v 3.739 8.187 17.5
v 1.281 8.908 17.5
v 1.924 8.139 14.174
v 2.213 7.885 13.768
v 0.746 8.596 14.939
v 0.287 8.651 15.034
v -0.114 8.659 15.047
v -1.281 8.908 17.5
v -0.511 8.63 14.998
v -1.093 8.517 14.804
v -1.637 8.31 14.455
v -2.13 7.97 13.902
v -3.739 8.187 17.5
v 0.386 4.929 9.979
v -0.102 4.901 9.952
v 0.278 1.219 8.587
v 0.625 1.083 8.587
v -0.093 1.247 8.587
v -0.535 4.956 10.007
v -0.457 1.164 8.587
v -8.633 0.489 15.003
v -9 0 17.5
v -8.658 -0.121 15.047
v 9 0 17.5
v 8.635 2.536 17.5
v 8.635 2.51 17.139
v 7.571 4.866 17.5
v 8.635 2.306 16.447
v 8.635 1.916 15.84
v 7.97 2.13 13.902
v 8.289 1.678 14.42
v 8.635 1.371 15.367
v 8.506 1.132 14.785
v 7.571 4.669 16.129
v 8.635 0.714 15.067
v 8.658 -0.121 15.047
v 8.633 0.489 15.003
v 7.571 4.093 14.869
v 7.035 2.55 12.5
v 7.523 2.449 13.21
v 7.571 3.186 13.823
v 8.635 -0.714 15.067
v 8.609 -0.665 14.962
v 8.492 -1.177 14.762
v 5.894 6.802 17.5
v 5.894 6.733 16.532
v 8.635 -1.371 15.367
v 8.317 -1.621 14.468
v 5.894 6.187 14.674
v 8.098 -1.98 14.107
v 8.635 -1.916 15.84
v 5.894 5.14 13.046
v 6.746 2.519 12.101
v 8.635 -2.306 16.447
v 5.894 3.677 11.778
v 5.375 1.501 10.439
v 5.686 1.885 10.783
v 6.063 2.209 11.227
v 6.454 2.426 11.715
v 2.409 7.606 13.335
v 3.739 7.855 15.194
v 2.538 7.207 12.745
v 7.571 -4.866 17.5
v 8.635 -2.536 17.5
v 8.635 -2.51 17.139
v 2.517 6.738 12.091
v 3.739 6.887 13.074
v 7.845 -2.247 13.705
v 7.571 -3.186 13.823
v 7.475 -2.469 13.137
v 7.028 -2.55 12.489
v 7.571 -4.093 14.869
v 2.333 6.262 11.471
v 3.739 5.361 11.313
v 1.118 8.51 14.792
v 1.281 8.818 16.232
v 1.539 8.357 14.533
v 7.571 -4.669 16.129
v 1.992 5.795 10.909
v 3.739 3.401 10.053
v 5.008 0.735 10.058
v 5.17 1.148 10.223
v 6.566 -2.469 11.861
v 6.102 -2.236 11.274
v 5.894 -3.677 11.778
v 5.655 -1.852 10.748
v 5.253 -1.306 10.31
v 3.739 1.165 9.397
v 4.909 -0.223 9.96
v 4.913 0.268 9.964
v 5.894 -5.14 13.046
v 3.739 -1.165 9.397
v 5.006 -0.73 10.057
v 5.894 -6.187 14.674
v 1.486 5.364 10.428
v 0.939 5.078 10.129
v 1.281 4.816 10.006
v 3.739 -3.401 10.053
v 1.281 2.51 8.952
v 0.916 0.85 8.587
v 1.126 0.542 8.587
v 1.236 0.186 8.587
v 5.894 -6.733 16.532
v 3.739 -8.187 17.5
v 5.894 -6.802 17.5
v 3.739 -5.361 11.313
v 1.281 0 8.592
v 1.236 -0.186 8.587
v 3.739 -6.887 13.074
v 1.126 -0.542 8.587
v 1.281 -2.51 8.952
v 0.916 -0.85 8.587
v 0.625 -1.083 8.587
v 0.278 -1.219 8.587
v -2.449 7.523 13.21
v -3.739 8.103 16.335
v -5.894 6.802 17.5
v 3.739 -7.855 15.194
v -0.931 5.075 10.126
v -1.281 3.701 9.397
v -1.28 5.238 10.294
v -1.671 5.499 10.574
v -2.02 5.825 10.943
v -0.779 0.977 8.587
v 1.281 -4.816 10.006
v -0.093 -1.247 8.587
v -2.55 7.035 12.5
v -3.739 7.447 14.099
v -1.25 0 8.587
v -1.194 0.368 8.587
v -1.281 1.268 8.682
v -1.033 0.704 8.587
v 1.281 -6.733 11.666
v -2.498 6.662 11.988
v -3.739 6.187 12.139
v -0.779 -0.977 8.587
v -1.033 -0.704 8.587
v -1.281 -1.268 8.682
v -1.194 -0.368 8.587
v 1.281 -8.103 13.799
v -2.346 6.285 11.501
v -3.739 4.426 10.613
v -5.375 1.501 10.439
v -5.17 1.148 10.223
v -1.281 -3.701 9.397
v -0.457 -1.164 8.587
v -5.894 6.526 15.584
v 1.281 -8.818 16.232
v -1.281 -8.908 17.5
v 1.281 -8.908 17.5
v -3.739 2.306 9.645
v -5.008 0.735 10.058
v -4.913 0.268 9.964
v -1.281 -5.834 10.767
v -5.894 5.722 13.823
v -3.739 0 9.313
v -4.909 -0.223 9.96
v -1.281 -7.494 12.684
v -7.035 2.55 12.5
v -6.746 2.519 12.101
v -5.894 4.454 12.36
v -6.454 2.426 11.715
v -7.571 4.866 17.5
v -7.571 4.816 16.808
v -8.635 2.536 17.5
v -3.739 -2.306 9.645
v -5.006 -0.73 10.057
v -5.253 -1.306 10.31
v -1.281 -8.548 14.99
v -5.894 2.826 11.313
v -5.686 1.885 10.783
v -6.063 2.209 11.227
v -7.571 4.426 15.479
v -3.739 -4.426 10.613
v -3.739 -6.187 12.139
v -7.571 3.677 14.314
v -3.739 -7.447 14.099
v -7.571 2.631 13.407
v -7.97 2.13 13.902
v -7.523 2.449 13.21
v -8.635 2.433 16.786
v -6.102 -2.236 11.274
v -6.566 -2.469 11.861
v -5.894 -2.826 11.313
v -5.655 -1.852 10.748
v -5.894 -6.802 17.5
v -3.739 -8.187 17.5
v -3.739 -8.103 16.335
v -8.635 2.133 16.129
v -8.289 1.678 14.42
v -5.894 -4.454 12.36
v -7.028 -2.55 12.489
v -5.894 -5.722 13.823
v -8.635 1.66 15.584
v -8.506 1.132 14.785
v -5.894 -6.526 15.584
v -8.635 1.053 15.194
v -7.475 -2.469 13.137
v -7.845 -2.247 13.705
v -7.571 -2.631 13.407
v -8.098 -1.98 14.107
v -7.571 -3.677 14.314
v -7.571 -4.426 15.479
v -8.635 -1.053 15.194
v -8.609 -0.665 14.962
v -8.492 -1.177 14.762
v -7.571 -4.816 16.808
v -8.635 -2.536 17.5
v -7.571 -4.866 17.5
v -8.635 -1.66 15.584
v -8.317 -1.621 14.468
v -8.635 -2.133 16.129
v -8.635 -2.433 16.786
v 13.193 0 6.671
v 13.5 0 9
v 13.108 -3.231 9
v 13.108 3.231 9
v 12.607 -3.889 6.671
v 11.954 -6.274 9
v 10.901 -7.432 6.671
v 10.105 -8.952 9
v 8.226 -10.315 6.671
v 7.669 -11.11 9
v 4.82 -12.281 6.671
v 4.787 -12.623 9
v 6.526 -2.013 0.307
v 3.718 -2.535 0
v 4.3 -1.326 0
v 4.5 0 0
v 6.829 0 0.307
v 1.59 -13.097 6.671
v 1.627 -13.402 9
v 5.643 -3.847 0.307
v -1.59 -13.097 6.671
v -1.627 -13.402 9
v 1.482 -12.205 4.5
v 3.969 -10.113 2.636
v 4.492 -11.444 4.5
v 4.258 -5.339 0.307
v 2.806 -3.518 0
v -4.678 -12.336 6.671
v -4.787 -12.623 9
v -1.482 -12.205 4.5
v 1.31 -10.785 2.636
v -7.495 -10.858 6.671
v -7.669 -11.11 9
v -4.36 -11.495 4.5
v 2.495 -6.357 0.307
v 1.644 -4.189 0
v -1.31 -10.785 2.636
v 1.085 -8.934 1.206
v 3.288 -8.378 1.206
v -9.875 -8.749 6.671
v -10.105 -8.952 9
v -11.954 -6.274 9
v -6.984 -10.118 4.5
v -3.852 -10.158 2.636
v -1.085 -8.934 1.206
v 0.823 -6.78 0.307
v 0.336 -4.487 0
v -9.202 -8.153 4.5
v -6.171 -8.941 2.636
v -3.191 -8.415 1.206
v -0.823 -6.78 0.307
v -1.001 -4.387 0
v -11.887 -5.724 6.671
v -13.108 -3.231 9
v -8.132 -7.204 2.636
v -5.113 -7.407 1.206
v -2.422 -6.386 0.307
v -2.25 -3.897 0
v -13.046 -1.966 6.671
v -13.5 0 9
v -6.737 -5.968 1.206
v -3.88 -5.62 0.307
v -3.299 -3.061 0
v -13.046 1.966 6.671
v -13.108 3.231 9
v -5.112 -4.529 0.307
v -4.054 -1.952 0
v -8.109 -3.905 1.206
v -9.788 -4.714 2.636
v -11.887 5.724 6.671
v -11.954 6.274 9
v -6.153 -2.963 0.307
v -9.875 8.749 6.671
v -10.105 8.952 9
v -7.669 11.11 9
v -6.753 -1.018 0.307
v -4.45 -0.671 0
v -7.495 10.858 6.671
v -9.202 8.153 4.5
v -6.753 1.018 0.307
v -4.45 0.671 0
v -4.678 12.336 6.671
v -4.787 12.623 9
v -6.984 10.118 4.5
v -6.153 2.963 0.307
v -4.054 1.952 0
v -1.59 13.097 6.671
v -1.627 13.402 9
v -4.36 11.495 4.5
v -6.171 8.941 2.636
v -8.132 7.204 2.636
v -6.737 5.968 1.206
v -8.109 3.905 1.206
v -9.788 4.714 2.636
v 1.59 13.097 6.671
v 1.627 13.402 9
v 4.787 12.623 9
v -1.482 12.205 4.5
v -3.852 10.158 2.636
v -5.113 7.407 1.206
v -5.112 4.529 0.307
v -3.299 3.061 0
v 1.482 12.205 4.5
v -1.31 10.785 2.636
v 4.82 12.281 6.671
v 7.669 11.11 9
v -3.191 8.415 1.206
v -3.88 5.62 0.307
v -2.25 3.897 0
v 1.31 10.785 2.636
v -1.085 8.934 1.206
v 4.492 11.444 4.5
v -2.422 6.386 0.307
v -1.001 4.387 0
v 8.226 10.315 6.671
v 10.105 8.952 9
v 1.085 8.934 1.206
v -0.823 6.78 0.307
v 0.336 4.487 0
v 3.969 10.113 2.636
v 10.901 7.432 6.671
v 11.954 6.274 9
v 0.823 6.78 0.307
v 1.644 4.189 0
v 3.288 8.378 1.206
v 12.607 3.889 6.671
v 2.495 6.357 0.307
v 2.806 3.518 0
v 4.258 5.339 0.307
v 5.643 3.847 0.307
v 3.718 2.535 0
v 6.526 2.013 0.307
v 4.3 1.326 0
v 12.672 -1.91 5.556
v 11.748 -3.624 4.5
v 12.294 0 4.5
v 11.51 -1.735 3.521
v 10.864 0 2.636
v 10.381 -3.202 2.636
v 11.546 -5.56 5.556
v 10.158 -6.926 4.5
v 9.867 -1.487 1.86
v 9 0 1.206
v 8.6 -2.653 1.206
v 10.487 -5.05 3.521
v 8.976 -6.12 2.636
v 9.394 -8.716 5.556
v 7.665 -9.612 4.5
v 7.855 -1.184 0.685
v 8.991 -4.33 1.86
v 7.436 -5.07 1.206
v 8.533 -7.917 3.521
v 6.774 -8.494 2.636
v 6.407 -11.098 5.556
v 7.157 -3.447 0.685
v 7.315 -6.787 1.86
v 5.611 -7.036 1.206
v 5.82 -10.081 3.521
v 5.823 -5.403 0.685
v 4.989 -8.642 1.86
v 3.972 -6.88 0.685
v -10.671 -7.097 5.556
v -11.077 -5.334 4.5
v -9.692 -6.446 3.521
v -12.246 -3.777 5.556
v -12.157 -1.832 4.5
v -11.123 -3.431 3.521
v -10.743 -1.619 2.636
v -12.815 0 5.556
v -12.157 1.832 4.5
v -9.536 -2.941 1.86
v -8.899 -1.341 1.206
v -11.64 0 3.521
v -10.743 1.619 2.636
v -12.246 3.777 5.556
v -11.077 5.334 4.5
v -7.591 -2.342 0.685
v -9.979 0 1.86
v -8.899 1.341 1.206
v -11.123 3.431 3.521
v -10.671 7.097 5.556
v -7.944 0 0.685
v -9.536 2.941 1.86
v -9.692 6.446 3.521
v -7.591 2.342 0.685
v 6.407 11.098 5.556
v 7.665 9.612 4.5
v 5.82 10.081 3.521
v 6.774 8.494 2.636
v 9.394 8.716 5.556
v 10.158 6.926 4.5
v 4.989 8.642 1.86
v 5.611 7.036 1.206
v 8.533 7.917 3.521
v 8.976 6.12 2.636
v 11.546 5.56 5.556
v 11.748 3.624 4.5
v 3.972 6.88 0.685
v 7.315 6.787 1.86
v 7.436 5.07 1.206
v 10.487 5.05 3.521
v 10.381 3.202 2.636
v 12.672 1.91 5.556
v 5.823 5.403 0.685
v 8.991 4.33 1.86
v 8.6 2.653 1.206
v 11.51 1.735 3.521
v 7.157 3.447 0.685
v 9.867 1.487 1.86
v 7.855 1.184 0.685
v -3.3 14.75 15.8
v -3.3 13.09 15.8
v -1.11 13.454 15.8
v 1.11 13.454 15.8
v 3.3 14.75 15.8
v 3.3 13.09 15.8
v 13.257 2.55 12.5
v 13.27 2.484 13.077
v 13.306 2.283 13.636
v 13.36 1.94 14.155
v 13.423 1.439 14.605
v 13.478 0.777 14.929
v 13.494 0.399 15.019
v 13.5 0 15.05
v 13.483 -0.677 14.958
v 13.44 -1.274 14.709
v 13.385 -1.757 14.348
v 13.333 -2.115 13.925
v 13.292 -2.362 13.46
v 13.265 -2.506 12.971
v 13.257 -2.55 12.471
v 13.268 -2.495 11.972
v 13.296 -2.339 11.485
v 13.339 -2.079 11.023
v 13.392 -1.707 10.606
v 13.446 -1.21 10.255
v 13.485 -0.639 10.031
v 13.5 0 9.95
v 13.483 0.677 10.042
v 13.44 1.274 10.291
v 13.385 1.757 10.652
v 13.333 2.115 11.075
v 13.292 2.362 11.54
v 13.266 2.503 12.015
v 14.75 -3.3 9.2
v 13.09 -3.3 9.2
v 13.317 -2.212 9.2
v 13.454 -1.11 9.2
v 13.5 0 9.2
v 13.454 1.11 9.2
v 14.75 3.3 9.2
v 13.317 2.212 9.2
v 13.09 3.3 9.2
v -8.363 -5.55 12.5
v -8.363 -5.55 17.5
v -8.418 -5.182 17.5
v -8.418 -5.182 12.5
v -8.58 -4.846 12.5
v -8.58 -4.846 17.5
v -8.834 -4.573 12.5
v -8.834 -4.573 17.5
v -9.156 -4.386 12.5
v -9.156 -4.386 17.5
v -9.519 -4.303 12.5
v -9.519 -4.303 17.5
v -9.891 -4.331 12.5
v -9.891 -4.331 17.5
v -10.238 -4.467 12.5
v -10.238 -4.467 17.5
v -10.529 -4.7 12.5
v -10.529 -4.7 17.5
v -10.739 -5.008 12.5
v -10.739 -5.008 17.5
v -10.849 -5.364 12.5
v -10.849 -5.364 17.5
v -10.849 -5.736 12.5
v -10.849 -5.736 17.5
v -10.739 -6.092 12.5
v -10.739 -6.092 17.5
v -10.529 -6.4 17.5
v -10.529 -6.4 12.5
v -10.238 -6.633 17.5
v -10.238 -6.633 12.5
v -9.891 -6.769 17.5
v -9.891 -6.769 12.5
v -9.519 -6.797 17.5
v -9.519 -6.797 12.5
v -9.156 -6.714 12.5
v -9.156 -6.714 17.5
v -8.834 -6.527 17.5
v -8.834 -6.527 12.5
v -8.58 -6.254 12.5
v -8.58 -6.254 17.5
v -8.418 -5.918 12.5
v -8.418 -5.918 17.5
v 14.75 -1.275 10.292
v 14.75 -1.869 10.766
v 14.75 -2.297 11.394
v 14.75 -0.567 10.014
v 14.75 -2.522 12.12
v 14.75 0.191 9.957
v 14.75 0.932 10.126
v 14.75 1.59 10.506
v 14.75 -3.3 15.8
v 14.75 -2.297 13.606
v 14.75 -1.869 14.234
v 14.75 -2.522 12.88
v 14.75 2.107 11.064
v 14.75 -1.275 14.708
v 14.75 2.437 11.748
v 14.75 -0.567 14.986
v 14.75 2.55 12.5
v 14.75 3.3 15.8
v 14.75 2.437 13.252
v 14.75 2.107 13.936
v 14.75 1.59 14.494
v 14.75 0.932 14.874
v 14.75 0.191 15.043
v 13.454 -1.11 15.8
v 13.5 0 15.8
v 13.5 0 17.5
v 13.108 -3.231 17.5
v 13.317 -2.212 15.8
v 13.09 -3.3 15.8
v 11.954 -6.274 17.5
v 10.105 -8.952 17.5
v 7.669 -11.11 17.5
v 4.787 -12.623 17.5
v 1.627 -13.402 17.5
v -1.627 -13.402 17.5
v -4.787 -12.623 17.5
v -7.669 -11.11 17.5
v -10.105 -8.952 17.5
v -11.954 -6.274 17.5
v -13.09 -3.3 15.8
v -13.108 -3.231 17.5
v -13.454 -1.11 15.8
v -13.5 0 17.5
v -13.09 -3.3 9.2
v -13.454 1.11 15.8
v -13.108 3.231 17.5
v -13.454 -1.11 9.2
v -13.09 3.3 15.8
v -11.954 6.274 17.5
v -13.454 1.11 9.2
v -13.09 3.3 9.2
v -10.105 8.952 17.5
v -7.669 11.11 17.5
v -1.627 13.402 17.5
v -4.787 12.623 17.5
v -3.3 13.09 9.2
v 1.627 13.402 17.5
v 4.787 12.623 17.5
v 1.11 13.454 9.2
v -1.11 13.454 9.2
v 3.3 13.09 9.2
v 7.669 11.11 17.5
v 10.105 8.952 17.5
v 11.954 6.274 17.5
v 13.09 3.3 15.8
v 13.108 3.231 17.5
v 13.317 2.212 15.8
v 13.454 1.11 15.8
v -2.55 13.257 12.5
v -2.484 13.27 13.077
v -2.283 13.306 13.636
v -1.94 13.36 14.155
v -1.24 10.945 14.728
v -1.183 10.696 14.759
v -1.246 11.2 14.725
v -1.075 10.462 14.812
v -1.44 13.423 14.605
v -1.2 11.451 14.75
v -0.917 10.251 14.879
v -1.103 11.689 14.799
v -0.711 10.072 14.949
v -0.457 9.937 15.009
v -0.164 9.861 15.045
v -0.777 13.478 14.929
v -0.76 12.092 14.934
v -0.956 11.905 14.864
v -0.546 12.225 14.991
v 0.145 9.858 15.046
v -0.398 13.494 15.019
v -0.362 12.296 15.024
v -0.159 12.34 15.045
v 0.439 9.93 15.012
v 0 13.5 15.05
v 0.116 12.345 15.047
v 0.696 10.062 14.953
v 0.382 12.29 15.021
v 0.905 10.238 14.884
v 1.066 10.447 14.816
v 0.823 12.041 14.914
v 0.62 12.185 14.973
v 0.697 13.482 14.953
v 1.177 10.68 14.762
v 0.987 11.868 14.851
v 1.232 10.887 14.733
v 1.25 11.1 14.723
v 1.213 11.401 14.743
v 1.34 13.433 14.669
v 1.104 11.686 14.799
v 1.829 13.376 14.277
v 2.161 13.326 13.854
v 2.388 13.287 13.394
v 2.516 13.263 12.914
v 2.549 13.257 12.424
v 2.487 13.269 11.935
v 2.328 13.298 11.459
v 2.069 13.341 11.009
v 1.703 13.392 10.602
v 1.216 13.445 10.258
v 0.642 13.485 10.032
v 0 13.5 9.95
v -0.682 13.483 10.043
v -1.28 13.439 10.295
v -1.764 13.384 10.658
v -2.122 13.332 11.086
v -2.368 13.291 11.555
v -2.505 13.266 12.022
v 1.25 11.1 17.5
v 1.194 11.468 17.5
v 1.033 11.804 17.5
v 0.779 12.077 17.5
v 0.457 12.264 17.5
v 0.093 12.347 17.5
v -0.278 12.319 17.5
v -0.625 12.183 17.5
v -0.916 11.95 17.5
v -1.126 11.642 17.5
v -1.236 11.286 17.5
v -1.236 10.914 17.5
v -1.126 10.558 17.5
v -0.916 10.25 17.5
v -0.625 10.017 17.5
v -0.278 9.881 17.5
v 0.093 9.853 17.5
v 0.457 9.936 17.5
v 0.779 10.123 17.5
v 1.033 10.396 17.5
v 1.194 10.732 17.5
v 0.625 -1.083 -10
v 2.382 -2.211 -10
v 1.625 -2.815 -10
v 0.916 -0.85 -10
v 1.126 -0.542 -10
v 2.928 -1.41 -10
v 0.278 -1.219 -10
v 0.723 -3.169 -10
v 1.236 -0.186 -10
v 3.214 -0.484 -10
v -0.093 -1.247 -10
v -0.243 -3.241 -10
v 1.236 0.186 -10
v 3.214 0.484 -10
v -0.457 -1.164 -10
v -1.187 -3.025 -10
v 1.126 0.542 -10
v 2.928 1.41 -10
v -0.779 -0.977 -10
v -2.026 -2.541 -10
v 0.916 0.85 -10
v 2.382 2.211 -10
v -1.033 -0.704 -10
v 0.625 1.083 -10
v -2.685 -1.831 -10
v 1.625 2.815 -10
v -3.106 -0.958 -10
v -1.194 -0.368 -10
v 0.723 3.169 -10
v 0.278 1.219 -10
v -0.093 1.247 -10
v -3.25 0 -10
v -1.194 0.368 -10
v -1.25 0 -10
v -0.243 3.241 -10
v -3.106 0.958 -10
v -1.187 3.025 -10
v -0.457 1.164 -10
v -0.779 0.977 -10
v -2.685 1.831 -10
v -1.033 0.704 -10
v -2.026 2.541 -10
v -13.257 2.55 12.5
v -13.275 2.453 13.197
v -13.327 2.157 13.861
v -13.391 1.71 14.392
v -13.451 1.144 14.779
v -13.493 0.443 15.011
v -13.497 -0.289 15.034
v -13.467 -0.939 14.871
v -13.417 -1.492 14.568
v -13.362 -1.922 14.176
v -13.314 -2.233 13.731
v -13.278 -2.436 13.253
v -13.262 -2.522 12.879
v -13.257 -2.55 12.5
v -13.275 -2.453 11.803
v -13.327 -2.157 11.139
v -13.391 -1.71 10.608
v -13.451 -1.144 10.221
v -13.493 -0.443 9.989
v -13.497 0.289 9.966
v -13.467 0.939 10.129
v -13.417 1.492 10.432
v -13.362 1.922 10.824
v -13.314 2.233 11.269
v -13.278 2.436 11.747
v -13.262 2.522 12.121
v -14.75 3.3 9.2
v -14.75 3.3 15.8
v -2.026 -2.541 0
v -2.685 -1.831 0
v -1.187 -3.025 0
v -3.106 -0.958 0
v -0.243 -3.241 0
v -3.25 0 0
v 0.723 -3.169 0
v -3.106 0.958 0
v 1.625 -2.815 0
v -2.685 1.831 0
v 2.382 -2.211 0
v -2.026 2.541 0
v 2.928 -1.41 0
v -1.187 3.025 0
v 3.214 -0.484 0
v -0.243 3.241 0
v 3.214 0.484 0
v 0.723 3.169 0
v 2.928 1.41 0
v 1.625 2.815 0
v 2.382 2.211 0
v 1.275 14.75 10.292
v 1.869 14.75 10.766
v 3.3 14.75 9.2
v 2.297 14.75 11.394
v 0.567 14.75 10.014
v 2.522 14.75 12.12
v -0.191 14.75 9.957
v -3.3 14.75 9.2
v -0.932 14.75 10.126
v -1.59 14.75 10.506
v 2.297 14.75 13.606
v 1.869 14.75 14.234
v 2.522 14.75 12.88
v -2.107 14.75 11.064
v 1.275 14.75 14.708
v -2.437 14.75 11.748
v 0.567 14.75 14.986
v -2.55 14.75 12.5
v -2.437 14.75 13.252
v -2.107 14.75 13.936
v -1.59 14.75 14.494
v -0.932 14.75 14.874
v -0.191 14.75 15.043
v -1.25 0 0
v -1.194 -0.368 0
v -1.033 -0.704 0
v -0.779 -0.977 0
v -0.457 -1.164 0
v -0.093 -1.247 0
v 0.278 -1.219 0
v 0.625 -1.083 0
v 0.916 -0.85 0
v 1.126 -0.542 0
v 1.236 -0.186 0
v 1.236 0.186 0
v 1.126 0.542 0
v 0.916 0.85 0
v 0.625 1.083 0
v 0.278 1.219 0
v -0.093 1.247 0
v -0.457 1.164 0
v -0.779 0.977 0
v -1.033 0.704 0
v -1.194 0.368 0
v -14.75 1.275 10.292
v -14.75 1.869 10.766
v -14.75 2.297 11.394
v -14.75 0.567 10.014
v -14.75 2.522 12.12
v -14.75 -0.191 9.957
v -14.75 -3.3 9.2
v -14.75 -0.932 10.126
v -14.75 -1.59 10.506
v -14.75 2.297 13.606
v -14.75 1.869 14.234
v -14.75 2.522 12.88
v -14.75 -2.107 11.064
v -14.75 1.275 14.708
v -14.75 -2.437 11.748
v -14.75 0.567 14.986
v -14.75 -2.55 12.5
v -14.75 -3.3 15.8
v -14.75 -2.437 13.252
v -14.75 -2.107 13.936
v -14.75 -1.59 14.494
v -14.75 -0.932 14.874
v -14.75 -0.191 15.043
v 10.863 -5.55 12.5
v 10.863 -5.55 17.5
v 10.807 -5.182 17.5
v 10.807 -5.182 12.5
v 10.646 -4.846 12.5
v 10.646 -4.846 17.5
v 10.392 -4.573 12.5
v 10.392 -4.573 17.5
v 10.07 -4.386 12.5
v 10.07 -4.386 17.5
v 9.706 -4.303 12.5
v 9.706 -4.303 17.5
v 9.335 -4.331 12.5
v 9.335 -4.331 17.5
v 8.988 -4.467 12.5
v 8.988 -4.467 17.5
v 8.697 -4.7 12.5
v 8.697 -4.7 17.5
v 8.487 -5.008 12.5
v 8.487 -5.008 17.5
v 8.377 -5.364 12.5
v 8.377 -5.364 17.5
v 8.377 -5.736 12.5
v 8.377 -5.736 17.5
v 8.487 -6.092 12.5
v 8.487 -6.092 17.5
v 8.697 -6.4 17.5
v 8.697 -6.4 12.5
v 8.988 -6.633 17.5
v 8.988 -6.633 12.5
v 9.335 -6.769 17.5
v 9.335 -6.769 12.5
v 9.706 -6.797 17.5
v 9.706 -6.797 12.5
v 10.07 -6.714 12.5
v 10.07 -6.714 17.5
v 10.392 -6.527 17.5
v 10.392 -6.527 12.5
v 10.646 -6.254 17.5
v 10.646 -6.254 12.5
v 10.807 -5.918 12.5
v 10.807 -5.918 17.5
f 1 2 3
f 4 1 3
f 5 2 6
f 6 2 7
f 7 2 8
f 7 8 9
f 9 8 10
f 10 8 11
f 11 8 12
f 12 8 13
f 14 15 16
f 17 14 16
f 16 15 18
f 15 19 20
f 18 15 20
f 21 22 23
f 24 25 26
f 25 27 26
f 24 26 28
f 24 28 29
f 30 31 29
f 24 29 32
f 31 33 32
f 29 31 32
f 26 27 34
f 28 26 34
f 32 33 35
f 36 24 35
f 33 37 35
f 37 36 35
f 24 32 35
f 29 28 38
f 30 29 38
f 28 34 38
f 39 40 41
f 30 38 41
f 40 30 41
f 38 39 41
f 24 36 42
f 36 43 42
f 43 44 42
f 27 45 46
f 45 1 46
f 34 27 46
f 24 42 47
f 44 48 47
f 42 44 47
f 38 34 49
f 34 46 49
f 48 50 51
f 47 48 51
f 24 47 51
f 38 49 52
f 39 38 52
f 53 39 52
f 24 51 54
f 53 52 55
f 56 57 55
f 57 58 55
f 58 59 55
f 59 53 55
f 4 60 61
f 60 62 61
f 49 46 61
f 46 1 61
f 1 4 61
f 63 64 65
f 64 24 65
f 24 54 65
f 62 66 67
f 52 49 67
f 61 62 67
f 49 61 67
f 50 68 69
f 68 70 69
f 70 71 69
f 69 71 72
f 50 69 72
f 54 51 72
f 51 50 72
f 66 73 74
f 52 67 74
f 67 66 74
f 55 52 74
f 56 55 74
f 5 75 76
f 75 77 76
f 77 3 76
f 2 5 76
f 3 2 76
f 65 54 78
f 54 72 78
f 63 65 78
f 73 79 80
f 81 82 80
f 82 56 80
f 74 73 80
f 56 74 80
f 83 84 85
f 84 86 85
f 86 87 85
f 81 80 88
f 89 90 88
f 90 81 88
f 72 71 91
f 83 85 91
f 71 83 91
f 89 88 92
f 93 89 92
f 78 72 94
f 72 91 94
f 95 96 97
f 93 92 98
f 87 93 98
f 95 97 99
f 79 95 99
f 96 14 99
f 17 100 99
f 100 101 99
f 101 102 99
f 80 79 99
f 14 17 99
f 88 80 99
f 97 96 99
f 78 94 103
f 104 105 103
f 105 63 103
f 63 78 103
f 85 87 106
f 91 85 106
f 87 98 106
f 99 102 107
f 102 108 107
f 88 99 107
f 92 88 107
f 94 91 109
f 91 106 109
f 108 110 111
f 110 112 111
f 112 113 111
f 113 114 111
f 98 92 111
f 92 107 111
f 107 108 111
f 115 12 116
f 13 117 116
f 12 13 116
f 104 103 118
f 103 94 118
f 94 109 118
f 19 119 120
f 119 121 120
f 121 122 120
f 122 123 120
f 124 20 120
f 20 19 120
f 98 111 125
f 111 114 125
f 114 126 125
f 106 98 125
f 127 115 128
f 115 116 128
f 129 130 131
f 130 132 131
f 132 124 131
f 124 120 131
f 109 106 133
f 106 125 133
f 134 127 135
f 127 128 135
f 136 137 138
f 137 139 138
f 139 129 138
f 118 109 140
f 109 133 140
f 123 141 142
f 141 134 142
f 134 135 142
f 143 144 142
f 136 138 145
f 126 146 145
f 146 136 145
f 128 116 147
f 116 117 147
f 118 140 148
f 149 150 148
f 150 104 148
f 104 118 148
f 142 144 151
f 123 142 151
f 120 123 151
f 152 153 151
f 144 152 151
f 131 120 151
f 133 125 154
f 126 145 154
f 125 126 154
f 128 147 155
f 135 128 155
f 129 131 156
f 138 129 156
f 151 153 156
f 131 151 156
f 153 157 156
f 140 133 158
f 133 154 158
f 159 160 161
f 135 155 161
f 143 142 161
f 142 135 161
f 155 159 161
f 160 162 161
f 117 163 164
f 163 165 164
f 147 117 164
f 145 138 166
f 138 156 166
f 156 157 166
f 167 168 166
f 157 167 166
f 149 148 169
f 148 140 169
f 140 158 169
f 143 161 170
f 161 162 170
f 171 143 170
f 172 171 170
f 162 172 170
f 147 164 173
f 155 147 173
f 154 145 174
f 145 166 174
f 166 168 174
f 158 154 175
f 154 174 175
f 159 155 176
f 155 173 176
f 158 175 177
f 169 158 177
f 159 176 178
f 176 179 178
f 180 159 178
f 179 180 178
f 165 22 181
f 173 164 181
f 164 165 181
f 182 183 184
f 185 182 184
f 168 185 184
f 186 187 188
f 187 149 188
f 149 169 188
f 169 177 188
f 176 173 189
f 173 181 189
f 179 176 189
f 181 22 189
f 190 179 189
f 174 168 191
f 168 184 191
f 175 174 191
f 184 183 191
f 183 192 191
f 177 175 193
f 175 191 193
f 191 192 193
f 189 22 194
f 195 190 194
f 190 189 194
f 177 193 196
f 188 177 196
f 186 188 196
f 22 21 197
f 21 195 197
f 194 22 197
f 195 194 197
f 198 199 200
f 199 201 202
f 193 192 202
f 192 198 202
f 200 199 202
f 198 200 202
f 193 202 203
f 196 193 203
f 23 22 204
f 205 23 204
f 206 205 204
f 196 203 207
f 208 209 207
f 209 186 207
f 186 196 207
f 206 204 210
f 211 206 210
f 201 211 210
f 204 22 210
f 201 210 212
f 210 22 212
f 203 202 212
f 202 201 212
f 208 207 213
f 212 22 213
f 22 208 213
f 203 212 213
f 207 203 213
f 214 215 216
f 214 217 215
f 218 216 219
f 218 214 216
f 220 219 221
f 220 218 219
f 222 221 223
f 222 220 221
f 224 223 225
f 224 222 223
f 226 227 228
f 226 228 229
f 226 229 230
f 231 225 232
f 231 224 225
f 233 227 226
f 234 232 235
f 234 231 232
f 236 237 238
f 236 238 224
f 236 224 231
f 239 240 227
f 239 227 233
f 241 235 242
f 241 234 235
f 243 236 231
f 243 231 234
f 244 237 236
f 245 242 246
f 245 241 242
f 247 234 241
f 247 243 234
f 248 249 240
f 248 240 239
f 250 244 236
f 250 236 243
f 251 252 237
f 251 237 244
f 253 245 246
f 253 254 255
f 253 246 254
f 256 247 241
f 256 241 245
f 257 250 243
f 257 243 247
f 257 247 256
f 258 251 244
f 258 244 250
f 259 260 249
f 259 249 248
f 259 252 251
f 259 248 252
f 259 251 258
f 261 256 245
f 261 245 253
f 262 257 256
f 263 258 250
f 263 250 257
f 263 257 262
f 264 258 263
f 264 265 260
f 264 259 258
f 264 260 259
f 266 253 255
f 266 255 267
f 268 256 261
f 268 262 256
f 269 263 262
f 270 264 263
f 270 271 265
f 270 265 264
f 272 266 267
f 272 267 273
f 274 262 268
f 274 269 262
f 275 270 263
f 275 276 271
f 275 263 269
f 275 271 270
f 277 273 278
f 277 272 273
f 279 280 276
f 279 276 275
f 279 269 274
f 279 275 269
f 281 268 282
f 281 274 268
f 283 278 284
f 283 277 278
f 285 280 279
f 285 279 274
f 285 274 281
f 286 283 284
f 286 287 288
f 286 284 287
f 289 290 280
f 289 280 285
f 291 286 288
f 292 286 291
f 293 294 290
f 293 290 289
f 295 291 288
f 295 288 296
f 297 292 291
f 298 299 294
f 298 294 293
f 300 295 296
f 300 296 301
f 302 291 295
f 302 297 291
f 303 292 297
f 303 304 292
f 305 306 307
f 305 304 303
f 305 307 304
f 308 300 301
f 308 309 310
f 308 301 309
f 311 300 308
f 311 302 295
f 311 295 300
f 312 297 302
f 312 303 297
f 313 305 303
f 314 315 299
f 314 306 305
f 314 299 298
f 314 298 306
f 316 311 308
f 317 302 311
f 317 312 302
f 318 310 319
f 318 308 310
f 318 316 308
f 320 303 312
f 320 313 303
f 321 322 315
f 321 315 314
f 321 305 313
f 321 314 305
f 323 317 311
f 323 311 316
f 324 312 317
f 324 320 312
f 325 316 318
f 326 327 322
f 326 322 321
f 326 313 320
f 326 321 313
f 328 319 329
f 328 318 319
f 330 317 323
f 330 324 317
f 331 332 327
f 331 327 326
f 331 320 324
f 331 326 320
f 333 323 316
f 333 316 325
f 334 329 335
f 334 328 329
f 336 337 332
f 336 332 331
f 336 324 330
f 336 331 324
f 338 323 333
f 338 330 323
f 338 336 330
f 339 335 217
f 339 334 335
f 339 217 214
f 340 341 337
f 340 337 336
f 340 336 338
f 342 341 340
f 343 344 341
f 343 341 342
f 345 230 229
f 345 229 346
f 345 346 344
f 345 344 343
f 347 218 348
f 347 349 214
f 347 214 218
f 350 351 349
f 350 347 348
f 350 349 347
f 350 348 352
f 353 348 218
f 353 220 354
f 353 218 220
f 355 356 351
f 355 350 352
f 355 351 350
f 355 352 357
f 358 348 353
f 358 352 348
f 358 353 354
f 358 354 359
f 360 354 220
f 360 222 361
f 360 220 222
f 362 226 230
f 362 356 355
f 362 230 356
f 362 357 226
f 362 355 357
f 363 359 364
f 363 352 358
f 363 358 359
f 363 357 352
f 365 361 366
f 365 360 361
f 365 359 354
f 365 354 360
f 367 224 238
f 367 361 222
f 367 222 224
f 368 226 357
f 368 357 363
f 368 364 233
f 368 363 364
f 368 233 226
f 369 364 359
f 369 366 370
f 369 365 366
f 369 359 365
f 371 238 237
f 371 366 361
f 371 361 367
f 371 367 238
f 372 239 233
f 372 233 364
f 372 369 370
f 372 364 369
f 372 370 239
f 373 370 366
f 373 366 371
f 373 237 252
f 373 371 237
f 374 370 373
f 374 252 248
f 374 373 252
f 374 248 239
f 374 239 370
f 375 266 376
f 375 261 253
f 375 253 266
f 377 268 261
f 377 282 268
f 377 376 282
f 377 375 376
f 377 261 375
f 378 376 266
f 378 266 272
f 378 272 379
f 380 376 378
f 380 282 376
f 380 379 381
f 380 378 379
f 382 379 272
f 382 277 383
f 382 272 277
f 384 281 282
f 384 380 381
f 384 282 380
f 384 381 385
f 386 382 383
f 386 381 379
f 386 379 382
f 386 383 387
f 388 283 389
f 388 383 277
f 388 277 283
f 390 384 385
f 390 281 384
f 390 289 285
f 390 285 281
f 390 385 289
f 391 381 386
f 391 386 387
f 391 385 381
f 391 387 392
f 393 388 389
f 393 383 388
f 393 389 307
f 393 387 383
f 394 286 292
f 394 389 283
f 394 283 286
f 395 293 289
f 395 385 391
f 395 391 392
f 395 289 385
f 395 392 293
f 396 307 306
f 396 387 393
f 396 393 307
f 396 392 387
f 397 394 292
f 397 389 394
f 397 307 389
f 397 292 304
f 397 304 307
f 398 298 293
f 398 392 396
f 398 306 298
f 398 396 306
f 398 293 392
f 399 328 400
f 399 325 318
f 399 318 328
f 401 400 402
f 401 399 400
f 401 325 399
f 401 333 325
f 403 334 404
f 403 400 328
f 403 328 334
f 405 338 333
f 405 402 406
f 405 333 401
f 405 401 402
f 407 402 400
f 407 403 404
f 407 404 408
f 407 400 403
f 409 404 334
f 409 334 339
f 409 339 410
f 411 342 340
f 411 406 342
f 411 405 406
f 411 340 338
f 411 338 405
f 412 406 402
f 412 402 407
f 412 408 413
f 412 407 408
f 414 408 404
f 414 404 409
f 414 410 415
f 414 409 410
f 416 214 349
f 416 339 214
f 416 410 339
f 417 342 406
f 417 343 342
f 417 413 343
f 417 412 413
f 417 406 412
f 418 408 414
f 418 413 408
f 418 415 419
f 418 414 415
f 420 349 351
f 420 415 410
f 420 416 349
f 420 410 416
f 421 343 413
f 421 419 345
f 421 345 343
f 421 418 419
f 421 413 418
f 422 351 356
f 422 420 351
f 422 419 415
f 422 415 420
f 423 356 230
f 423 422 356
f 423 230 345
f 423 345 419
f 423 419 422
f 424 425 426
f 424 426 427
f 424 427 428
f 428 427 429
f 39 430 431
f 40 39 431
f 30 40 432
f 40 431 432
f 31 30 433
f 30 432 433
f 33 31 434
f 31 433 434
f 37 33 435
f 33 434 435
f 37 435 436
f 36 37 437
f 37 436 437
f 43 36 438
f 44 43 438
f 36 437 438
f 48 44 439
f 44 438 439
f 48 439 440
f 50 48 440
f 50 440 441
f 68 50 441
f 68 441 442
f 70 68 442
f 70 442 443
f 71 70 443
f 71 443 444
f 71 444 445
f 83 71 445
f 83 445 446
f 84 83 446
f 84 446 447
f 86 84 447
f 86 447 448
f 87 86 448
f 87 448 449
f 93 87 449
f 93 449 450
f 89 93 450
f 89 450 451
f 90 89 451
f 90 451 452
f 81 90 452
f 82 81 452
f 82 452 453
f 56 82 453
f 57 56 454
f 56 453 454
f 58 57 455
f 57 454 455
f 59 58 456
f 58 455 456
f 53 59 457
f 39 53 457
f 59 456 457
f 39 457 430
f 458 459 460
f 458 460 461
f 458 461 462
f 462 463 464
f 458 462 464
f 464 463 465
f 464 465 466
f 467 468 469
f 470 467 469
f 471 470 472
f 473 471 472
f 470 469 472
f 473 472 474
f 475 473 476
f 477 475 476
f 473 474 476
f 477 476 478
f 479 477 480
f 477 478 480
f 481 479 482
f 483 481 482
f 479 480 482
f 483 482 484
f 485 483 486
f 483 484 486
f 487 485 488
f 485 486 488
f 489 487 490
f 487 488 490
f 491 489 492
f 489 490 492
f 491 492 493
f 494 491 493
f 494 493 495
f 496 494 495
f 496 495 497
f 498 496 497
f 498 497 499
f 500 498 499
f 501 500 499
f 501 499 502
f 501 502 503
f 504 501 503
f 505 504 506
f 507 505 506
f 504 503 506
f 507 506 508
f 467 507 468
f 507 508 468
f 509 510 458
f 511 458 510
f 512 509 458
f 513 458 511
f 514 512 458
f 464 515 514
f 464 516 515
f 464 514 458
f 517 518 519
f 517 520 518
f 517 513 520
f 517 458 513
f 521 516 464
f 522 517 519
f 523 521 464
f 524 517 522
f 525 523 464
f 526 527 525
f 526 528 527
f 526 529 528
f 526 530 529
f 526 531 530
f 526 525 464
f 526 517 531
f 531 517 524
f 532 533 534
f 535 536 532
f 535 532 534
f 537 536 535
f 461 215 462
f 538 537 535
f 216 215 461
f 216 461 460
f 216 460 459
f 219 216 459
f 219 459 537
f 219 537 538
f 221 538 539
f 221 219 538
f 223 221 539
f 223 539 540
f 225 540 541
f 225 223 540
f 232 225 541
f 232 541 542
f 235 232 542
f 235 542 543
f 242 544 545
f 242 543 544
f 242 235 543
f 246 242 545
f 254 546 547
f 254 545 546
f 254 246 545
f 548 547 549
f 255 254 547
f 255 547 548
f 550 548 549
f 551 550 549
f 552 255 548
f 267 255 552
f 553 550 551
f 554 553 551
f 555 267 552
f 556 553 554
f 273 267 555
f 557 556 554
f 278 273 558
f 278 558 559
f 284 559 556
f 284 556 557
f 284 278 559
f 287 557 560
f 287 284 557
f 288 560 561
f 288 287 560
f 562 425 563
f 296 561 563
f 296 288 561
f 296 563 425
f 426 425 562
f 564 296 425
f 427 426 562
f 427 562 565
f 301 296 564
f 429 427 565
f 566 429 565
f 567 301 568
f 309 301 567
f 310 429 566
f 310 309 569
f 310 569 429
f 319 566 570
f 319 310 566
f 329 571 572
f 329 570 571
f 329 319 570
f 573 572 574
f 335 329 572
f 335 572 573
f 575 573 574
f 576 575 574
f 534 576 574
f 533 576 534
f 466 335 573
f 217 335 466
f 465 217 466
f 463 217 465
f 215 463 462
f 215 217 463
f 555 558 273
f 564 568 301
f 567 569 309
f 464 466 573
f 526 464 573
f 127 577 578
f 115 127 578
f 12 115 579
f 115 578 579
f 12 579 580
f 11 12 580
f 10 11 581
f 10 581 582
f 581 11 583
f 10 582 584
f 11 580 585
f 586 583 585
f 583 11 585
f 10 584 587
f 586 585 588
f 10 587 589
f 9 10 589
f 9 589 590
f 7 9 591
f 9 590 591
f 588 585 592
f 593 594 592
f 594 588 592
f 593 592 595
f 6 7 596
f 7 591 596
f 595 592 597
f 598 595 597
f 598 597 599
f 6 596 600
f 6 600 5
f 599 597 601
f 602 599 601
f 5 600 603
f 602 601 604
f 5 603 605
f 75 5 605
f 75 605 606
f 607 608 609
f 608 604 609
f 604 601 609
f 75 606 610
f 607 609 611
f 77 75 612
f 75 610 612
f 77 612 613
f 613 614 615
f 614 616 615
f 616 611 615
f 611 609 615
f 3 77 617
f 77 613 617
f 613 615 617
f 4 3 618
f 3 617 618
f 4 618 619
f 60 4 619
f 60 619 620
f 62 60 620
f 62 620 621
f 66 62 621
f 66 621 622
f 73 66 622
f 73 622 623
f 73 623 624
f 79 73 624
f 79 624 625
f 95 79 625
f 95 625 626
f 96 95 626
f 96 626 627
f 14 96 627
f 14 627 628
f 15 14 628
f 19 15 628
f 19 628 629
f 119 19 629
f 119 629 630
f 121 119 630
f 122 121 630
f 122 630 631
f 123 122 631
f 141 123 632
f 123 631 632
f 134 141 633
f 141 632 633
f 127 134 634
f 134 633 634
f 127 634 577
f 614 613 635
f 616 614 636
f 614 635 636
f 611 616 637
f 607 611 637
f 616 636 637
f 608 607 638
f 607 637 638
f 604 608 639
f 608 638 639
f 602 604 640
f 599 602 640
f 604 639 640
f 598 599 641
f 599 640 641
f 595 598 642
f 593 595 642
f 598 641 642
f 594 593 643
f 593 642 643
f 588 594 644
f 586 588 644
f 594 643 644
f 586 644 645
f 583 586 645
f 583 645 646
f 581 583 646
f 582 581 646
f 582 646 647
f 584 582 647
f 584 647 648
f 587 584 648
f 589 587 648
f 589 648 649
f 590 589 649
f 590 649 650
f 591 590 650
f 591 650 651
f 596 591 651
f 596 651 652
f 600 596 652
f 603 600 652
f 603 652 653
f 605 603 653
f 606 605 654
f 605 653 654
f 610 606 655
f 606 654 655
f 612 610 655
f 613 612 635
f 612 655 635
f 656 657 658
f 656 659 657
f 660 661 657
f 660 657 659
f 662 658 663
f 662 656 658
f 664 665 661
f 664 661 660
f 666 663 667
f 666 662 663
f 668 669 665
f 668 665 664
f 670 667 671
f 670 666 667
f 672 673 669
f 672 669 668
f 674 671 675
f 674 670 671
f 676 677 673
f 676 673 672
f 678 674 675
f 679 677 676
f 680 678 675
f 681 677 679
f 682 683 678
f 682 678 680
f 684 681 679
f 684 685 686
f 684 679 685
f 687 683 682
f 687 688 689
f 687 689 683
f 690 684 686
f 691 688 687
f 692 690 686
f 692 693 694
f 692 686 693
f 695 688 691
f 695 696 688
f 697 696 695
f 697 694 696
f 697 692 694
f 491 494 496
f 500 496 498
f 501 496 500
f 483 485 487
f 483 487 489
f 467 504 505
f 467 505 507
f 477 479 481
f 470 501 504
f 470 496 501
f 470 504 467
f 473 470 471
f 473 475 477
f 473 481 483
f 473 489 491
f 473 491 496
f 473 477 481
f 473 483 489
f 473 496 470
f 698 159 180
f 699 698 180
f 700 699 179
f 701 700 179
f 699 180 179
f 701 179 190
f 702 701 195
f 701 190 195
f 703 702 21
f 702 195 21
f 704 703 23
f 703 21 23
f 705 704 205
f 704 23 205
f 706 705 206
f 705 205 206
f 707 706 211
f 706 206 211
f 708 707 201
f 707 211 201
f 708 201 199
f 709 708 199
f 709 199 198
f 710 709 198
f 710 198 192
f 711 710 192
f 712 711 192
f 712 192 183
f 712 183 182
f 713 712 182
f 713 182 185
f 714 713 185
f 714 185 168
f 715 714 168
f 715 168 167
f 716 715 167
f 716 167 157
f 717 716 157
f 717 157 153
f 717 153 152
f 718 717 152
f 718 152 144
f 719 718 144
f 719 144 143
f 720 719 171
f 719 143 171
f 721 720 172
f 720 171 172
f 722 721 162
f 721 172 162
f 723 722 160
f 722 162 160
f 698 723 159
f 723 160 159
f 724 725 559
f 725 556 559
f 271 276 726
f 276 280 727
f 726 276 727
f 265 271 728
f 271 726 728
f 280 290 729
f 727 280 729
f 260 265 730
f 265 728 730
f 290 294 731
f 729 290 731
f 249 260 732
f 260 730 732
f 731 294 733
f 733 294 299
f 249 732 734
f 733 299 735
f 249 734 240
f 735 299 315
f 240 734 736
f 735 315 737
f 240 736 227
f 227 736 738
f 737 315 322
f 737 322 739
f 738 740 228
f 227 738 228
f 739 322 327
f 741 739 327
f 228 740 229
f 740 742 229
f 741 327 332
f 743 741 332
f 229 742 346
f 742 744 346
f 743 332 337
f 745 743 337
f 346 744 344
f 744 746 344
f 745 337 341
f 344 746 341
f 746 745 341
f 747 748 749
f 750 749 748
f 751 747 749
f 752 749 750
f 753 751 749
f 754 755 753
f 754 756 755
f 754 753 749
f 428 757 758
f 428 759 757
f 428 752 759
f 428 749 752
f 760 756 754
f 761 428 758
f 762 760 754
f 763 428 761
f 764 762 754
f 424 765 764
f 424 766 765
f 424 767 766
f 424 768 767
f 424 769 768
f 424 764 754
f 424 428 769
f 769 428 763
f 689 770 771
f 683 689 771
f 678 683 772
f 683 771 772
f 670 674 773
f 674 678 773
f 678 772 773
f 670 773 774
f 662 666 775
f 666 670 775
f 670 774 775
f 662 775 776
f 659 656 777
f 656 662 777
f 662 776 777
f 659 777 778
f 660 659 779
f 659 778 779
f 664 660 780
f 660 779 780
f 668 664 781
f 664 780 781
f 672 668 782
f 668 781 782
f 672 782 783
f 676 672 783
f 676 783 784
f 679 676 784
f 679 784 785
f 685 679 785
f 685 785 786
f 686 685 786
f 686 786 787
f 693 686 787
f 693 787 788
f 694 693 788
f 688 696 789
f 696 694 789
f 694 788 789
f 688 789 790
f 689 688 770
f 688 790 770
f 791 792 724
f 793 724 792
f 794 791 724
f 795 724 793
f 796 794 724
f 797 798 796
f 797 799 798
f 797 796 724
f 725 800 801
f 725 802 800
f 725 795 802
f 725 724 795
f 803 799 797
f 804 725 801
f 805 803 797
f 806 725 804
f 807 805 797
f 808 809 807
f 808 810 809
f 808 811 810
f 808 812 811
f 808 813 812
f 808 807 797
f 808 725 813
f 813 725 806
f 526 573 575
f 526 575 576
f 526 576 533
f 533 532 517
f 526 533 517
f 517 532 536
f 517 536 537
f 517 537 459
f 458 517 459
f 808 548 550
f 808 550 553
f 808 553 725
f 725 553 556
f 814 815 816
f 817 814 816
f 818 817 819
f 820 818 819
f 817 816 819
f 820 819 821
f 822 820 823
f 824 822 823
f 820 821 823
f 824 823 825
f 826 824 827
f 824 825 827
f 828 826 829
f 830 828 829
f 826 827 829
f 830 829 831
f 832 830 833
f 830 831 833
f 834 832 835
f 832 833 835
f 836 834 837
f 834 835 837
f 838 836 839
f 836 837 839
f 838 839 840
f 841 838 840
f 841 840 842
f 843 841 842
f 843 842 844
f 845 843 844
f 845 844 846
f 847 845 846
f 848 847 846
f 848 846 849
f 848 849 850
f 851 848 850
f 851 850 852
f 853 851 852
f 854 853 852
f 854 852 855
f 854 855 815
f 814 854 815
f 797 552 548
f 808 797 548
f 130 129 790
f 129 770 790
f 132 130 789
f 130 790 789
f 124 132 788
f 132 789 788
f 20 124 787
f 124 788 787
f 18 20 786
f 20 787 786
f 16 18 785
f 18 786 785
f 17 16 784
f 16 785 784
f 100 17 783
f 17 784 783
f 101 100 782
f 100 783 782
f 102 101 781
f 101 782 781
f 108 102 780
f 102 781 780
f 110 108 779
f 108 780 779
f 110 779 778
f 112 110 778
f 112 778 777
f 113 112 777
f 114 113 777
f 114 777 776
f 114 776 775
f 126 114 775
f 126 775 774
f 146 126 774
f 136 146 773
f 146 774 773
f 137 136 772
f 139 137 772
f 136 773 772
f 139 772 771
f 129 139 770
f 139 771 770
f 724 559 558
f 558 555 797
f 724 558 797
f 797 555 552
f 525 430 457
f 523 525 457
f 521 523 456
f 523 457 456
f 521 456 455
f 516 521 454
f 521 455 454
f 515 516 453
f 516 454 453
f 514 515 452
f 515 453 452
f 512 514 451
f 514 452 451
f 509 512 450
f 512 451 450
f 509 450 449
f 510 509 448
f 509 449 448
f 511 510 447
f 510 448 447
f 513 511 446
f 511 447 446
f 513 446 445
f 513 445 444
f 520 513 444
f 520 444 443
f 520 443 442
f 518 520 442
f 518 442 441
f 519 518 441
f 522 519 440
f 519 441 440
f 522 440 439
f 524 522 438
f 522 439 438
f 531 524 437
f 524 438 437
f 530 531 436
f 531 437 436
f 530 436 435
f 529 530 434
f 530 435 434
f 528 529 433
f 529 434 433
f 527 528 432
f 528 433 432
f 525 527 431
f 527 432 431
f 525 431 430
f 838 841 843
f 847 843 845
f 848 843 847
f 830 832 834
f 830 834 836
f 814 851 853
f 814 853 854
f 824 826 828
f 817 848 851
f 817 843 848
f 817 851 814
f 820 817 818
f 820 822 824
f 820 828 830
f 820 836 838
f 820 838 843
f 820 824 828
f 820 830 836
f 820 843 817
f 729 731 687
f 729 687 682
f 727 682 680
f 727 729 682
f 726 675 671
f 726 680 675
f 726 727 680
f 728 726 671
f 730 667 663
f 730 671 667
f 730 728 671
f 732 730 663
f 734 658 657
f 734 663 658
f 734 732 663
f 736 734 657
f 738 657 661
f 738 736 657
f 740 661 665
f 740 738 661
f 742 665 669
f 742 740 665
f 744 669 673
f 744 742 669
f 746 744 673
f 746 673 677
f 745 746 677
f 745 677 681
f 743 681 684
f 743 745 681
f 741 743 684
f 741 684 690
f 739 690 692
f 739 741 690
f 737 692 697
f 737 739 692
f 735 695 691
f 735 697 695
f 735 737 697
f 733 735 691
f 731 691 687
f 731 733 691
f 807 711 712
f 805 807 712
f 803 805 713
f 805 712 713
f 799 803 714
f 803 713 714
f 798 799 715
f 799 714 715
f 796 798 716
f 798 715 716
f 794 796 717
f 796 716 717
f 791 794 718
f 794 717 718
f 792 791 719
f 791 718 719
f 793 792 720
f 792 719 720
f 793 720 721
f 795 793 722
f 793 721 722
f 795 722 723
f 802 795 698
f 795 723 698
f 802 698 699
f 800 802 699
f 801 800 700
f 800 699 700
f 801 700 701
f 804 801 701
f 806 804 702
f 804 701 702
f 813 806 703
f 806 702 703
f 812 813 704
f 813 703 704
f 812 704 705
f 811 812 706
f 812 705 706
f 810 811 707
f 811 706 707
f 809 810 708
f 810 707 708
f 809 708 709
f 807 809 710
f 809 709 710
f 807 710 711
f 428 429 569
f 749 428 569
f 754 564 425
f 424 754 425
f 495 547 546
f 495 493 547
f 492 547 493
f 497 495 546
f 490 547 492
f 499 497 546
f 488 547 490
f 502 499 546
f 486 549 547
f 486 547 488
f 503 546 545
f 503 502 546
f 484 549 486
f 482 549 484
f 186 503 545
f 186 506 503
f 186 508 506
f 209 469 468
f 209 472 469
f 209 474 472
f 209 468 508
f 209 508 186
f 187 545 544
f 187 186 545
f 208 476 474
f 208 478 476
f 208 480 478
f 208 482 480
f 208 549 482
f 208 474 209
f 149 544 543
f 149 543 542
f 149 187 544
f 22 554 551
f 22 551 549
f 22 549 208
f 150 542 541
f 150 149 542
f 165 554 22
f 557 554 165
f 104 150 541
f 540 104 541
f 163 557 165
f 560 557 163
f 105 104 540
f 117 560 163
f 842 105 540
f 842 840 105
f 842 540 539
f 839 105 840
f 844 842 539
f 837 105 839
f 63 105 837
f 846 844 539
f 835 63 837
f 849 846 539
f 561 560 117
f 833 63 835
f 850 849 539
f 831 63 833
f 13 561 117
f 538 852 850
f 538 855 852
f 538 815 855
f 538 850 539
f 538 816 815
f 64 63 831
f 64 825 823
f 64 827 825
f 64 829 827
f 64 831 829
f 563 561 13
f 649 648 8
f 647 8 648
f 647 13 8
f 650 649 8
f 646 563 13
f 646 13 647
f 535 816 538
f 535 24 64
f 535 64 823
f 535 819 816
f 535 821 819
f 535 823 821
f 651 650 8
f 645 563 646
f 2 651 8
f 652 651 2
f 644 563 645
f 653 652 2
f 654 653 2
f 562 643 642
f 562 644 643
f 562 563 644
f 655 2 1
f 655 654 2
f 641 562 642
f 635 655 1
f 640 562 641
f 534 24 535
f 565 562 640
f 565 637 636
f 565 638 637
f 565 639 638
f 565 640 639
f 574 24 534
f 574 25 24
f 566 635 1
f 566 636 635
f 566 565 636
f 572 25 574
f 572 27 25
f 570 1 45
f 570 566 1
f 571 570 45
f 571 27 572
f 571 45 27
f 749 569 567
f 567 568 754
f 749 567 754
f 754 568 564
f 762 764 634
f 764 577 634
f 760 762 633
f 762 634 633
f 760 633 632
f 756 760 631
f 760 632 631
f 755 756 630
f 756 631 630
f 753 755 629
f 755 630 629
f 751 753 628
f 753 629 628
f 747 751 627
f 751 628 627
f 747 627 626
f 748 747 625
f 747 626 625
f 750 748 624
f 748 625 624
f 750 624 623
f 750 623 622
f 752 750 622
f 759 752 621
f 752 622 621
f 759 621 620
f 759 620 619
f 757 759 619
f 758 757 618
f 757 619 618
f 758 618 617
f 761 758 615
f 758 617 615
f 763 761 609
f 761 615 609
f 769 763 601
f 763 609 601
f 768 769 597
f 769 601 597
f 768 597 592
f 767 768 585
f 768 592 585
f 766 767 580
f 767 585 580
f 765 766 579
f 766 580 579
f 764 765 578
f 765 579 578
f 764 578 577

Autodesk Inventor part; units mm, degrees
sketch "Sketch2" plane through (0, 0, 0) normal (0, 0, 1) x (1, 0, 0)
  circle A0 centre (0, 0) radius 13.5
  dimension "d0" = 27
extrude "Base" add sketch "Sketch2" along normal blind 17.5
ref_plane "Work Plane1" through (13.5, 0, 0) normal (1, 0, 0) x (0, 1, 0)
sketch "Sketch3" plane through (13.5, 0, 0) normal (1, 0, 0) x (0, 1, 0)
  line L0 (13.5, 17.5) -> (-13.5, 17.5) projected
  line L1 (13.5, 0) -> (-13.5, 0) projected
  circle A0 centre (0, 12.5) radius 2.55
  point P0 (0, 0)
  dimension "d4" = 5.1
  dimension "d31" = 5
extrude "IR hole" cut sketch "Sketch3" against normal through all
ref_plane "Work Plane2" through (0, 13.5, 0) normal (0, 1, 0) x (-1, 0, 0)
sketch "Sketch4" plane through (0, 13.5, 0) normal (0, 1, 0) x (-1, 0, 0)
  line L0 (13.5, 17.5) -> (-13.5, 17.5) construction
  line L1 (13.5, 0) -> (-13.5, 0) construction
  circle A0 centre (0, 12.5) radius 2.55
  point P0 (0, 0)
  dimension "d7" = 5.1
  dimension "d32" = 5
extrude "LED Hole" cut sketch "Sketch4" against normal blind 13.5
sketch "Sketch7" plane through (0, 0, 0) normal (0, 0, -1) x (-1, 0, 0)
  circle A0 centre (0, 0) radius 1.25
  circle A1 centre (0, 0) radius 3.25
  dimension "d24" = 2.5
  dimension "d39" = 2
extrude "Water Tube wall" add sketch "Sketch7" along normal blind 10
fillet "Fillet1" radius 9 1 edges at (-13.5, 0, 0)
ref_plane "Work Plane3" through (0, 0, 0) normal (0, 0, 1) x (1, 0, 0)
sketch "Sketch13" plane through (0, 0, 17.5) normal (0, 0, 1) x (1, 0, 0)
  circle A0 centre (0, 0) radius 1.25 projected
  circle A1 centre (0, 0) radius 9
  circle A2 centre (0, 0) radius 13.5 projected
  line L0 (-9, 0) -> (9, 0)
  point P0 (-1.25, 0)
  point P1 (1.25, 0)
  dimension "d40" = 4.5
  dimension "d66" = 18
revolve "Inner cut out" cut sketch "Sketch13" angle 360 about axis through (-9, 0, 17.5) along (1, 0, 0) picked at (-6.3174, 0.8177) contours A0 L0 A1
sketch "Sketch14" plane through (0, 0, 17.5) normal (0, 0, 1) x (1, 0, 0)
  circle A0 centre (0, 11.1) radius 1.25
  line L0 (-18.9, 13.5) -> (18.9, 13.5) construction
  circle A1 centre (0, 0) radius 13.5 construction
  line L1 (0, 13.5) -> (0, 9) construction
  circle A2 centre (0, 0) radius 9 construction
  circle A3 centre (-9.6129, -5.55) radius 1.25
  circle A4 centre (9.6129, -5.55) radius 1.25
  circle A5 centre (0, 0) radius 11.1 construction
  dimension "d67" = 22.2
  dimension "d42" = 2.5
  dimension "d43" = 2.4
  dimension "d44" = 4.5
  dimension "d47" = 360
extrude "Mount screw holes" cut sketch "Sketch14" against normal blind 5
ref_plane "Work Plane4" through (12.5, 0, 0) normal (1, 0, 0) x (0, 1, 0)
sketch "Sketch15" plane through (12.5, 0, 0) normal (1, 0, 0) x (0, 1, 0)
  circle A0 centre (0, 12.5) radius 2.55
  line L0 (13.5, 17.5) -> (-13.5, 17.5) projected
  line L1 (-3.3, 9.2) -> (3.3, 9.2)
  line L2 (3.3, 9.2) -> (3.3, 15.8)
  line L3 (3.3, 15.8) -> (-3.3, 15.8)
  line L4 (-3.3, 15.8) -> (-3.3, 9.2)
  line L5 (-3.3, 9.2) -> (3.3, 15.8) construction
  line L6 (3.3, 9.2) -> (-3.3, 15.8) construction
  point P0 (0, 0)
  dimension "d52" = 5
  dimension "d53" = 5.1
  dimension "d54" = 6.6
  dimension "d55" = 6.6
extrude "Hole wall" add sketch "Sketch15" along normal blind 2.25
pattern_circular "Circular Pattern1" count 3 over 180 about axis through (0, 0, 0) along (0, 0, 1) of "Hole wall"
sketch "Sketch17" plane through (0, 0, 0) normal (0, 0, -1) x (-1, 0, 0)
  circle A0 centre (0, 0) radius 1.25 projected
  circle A1 centre (0, 0) radius 1.1
  dimension "d68" = 2.5
extrude "Extrusion12" cut sketch "Sketch17" against normal blind 20 contours A0 | A1
equation "\"d8\" = 0.5 * d0"
equation "\"d52\" = d31"
equation "\"d53\" = d4"
equation "\"d55\" = d54"
properties part number "Large_mouse_poke" material "ABS Plastic"
